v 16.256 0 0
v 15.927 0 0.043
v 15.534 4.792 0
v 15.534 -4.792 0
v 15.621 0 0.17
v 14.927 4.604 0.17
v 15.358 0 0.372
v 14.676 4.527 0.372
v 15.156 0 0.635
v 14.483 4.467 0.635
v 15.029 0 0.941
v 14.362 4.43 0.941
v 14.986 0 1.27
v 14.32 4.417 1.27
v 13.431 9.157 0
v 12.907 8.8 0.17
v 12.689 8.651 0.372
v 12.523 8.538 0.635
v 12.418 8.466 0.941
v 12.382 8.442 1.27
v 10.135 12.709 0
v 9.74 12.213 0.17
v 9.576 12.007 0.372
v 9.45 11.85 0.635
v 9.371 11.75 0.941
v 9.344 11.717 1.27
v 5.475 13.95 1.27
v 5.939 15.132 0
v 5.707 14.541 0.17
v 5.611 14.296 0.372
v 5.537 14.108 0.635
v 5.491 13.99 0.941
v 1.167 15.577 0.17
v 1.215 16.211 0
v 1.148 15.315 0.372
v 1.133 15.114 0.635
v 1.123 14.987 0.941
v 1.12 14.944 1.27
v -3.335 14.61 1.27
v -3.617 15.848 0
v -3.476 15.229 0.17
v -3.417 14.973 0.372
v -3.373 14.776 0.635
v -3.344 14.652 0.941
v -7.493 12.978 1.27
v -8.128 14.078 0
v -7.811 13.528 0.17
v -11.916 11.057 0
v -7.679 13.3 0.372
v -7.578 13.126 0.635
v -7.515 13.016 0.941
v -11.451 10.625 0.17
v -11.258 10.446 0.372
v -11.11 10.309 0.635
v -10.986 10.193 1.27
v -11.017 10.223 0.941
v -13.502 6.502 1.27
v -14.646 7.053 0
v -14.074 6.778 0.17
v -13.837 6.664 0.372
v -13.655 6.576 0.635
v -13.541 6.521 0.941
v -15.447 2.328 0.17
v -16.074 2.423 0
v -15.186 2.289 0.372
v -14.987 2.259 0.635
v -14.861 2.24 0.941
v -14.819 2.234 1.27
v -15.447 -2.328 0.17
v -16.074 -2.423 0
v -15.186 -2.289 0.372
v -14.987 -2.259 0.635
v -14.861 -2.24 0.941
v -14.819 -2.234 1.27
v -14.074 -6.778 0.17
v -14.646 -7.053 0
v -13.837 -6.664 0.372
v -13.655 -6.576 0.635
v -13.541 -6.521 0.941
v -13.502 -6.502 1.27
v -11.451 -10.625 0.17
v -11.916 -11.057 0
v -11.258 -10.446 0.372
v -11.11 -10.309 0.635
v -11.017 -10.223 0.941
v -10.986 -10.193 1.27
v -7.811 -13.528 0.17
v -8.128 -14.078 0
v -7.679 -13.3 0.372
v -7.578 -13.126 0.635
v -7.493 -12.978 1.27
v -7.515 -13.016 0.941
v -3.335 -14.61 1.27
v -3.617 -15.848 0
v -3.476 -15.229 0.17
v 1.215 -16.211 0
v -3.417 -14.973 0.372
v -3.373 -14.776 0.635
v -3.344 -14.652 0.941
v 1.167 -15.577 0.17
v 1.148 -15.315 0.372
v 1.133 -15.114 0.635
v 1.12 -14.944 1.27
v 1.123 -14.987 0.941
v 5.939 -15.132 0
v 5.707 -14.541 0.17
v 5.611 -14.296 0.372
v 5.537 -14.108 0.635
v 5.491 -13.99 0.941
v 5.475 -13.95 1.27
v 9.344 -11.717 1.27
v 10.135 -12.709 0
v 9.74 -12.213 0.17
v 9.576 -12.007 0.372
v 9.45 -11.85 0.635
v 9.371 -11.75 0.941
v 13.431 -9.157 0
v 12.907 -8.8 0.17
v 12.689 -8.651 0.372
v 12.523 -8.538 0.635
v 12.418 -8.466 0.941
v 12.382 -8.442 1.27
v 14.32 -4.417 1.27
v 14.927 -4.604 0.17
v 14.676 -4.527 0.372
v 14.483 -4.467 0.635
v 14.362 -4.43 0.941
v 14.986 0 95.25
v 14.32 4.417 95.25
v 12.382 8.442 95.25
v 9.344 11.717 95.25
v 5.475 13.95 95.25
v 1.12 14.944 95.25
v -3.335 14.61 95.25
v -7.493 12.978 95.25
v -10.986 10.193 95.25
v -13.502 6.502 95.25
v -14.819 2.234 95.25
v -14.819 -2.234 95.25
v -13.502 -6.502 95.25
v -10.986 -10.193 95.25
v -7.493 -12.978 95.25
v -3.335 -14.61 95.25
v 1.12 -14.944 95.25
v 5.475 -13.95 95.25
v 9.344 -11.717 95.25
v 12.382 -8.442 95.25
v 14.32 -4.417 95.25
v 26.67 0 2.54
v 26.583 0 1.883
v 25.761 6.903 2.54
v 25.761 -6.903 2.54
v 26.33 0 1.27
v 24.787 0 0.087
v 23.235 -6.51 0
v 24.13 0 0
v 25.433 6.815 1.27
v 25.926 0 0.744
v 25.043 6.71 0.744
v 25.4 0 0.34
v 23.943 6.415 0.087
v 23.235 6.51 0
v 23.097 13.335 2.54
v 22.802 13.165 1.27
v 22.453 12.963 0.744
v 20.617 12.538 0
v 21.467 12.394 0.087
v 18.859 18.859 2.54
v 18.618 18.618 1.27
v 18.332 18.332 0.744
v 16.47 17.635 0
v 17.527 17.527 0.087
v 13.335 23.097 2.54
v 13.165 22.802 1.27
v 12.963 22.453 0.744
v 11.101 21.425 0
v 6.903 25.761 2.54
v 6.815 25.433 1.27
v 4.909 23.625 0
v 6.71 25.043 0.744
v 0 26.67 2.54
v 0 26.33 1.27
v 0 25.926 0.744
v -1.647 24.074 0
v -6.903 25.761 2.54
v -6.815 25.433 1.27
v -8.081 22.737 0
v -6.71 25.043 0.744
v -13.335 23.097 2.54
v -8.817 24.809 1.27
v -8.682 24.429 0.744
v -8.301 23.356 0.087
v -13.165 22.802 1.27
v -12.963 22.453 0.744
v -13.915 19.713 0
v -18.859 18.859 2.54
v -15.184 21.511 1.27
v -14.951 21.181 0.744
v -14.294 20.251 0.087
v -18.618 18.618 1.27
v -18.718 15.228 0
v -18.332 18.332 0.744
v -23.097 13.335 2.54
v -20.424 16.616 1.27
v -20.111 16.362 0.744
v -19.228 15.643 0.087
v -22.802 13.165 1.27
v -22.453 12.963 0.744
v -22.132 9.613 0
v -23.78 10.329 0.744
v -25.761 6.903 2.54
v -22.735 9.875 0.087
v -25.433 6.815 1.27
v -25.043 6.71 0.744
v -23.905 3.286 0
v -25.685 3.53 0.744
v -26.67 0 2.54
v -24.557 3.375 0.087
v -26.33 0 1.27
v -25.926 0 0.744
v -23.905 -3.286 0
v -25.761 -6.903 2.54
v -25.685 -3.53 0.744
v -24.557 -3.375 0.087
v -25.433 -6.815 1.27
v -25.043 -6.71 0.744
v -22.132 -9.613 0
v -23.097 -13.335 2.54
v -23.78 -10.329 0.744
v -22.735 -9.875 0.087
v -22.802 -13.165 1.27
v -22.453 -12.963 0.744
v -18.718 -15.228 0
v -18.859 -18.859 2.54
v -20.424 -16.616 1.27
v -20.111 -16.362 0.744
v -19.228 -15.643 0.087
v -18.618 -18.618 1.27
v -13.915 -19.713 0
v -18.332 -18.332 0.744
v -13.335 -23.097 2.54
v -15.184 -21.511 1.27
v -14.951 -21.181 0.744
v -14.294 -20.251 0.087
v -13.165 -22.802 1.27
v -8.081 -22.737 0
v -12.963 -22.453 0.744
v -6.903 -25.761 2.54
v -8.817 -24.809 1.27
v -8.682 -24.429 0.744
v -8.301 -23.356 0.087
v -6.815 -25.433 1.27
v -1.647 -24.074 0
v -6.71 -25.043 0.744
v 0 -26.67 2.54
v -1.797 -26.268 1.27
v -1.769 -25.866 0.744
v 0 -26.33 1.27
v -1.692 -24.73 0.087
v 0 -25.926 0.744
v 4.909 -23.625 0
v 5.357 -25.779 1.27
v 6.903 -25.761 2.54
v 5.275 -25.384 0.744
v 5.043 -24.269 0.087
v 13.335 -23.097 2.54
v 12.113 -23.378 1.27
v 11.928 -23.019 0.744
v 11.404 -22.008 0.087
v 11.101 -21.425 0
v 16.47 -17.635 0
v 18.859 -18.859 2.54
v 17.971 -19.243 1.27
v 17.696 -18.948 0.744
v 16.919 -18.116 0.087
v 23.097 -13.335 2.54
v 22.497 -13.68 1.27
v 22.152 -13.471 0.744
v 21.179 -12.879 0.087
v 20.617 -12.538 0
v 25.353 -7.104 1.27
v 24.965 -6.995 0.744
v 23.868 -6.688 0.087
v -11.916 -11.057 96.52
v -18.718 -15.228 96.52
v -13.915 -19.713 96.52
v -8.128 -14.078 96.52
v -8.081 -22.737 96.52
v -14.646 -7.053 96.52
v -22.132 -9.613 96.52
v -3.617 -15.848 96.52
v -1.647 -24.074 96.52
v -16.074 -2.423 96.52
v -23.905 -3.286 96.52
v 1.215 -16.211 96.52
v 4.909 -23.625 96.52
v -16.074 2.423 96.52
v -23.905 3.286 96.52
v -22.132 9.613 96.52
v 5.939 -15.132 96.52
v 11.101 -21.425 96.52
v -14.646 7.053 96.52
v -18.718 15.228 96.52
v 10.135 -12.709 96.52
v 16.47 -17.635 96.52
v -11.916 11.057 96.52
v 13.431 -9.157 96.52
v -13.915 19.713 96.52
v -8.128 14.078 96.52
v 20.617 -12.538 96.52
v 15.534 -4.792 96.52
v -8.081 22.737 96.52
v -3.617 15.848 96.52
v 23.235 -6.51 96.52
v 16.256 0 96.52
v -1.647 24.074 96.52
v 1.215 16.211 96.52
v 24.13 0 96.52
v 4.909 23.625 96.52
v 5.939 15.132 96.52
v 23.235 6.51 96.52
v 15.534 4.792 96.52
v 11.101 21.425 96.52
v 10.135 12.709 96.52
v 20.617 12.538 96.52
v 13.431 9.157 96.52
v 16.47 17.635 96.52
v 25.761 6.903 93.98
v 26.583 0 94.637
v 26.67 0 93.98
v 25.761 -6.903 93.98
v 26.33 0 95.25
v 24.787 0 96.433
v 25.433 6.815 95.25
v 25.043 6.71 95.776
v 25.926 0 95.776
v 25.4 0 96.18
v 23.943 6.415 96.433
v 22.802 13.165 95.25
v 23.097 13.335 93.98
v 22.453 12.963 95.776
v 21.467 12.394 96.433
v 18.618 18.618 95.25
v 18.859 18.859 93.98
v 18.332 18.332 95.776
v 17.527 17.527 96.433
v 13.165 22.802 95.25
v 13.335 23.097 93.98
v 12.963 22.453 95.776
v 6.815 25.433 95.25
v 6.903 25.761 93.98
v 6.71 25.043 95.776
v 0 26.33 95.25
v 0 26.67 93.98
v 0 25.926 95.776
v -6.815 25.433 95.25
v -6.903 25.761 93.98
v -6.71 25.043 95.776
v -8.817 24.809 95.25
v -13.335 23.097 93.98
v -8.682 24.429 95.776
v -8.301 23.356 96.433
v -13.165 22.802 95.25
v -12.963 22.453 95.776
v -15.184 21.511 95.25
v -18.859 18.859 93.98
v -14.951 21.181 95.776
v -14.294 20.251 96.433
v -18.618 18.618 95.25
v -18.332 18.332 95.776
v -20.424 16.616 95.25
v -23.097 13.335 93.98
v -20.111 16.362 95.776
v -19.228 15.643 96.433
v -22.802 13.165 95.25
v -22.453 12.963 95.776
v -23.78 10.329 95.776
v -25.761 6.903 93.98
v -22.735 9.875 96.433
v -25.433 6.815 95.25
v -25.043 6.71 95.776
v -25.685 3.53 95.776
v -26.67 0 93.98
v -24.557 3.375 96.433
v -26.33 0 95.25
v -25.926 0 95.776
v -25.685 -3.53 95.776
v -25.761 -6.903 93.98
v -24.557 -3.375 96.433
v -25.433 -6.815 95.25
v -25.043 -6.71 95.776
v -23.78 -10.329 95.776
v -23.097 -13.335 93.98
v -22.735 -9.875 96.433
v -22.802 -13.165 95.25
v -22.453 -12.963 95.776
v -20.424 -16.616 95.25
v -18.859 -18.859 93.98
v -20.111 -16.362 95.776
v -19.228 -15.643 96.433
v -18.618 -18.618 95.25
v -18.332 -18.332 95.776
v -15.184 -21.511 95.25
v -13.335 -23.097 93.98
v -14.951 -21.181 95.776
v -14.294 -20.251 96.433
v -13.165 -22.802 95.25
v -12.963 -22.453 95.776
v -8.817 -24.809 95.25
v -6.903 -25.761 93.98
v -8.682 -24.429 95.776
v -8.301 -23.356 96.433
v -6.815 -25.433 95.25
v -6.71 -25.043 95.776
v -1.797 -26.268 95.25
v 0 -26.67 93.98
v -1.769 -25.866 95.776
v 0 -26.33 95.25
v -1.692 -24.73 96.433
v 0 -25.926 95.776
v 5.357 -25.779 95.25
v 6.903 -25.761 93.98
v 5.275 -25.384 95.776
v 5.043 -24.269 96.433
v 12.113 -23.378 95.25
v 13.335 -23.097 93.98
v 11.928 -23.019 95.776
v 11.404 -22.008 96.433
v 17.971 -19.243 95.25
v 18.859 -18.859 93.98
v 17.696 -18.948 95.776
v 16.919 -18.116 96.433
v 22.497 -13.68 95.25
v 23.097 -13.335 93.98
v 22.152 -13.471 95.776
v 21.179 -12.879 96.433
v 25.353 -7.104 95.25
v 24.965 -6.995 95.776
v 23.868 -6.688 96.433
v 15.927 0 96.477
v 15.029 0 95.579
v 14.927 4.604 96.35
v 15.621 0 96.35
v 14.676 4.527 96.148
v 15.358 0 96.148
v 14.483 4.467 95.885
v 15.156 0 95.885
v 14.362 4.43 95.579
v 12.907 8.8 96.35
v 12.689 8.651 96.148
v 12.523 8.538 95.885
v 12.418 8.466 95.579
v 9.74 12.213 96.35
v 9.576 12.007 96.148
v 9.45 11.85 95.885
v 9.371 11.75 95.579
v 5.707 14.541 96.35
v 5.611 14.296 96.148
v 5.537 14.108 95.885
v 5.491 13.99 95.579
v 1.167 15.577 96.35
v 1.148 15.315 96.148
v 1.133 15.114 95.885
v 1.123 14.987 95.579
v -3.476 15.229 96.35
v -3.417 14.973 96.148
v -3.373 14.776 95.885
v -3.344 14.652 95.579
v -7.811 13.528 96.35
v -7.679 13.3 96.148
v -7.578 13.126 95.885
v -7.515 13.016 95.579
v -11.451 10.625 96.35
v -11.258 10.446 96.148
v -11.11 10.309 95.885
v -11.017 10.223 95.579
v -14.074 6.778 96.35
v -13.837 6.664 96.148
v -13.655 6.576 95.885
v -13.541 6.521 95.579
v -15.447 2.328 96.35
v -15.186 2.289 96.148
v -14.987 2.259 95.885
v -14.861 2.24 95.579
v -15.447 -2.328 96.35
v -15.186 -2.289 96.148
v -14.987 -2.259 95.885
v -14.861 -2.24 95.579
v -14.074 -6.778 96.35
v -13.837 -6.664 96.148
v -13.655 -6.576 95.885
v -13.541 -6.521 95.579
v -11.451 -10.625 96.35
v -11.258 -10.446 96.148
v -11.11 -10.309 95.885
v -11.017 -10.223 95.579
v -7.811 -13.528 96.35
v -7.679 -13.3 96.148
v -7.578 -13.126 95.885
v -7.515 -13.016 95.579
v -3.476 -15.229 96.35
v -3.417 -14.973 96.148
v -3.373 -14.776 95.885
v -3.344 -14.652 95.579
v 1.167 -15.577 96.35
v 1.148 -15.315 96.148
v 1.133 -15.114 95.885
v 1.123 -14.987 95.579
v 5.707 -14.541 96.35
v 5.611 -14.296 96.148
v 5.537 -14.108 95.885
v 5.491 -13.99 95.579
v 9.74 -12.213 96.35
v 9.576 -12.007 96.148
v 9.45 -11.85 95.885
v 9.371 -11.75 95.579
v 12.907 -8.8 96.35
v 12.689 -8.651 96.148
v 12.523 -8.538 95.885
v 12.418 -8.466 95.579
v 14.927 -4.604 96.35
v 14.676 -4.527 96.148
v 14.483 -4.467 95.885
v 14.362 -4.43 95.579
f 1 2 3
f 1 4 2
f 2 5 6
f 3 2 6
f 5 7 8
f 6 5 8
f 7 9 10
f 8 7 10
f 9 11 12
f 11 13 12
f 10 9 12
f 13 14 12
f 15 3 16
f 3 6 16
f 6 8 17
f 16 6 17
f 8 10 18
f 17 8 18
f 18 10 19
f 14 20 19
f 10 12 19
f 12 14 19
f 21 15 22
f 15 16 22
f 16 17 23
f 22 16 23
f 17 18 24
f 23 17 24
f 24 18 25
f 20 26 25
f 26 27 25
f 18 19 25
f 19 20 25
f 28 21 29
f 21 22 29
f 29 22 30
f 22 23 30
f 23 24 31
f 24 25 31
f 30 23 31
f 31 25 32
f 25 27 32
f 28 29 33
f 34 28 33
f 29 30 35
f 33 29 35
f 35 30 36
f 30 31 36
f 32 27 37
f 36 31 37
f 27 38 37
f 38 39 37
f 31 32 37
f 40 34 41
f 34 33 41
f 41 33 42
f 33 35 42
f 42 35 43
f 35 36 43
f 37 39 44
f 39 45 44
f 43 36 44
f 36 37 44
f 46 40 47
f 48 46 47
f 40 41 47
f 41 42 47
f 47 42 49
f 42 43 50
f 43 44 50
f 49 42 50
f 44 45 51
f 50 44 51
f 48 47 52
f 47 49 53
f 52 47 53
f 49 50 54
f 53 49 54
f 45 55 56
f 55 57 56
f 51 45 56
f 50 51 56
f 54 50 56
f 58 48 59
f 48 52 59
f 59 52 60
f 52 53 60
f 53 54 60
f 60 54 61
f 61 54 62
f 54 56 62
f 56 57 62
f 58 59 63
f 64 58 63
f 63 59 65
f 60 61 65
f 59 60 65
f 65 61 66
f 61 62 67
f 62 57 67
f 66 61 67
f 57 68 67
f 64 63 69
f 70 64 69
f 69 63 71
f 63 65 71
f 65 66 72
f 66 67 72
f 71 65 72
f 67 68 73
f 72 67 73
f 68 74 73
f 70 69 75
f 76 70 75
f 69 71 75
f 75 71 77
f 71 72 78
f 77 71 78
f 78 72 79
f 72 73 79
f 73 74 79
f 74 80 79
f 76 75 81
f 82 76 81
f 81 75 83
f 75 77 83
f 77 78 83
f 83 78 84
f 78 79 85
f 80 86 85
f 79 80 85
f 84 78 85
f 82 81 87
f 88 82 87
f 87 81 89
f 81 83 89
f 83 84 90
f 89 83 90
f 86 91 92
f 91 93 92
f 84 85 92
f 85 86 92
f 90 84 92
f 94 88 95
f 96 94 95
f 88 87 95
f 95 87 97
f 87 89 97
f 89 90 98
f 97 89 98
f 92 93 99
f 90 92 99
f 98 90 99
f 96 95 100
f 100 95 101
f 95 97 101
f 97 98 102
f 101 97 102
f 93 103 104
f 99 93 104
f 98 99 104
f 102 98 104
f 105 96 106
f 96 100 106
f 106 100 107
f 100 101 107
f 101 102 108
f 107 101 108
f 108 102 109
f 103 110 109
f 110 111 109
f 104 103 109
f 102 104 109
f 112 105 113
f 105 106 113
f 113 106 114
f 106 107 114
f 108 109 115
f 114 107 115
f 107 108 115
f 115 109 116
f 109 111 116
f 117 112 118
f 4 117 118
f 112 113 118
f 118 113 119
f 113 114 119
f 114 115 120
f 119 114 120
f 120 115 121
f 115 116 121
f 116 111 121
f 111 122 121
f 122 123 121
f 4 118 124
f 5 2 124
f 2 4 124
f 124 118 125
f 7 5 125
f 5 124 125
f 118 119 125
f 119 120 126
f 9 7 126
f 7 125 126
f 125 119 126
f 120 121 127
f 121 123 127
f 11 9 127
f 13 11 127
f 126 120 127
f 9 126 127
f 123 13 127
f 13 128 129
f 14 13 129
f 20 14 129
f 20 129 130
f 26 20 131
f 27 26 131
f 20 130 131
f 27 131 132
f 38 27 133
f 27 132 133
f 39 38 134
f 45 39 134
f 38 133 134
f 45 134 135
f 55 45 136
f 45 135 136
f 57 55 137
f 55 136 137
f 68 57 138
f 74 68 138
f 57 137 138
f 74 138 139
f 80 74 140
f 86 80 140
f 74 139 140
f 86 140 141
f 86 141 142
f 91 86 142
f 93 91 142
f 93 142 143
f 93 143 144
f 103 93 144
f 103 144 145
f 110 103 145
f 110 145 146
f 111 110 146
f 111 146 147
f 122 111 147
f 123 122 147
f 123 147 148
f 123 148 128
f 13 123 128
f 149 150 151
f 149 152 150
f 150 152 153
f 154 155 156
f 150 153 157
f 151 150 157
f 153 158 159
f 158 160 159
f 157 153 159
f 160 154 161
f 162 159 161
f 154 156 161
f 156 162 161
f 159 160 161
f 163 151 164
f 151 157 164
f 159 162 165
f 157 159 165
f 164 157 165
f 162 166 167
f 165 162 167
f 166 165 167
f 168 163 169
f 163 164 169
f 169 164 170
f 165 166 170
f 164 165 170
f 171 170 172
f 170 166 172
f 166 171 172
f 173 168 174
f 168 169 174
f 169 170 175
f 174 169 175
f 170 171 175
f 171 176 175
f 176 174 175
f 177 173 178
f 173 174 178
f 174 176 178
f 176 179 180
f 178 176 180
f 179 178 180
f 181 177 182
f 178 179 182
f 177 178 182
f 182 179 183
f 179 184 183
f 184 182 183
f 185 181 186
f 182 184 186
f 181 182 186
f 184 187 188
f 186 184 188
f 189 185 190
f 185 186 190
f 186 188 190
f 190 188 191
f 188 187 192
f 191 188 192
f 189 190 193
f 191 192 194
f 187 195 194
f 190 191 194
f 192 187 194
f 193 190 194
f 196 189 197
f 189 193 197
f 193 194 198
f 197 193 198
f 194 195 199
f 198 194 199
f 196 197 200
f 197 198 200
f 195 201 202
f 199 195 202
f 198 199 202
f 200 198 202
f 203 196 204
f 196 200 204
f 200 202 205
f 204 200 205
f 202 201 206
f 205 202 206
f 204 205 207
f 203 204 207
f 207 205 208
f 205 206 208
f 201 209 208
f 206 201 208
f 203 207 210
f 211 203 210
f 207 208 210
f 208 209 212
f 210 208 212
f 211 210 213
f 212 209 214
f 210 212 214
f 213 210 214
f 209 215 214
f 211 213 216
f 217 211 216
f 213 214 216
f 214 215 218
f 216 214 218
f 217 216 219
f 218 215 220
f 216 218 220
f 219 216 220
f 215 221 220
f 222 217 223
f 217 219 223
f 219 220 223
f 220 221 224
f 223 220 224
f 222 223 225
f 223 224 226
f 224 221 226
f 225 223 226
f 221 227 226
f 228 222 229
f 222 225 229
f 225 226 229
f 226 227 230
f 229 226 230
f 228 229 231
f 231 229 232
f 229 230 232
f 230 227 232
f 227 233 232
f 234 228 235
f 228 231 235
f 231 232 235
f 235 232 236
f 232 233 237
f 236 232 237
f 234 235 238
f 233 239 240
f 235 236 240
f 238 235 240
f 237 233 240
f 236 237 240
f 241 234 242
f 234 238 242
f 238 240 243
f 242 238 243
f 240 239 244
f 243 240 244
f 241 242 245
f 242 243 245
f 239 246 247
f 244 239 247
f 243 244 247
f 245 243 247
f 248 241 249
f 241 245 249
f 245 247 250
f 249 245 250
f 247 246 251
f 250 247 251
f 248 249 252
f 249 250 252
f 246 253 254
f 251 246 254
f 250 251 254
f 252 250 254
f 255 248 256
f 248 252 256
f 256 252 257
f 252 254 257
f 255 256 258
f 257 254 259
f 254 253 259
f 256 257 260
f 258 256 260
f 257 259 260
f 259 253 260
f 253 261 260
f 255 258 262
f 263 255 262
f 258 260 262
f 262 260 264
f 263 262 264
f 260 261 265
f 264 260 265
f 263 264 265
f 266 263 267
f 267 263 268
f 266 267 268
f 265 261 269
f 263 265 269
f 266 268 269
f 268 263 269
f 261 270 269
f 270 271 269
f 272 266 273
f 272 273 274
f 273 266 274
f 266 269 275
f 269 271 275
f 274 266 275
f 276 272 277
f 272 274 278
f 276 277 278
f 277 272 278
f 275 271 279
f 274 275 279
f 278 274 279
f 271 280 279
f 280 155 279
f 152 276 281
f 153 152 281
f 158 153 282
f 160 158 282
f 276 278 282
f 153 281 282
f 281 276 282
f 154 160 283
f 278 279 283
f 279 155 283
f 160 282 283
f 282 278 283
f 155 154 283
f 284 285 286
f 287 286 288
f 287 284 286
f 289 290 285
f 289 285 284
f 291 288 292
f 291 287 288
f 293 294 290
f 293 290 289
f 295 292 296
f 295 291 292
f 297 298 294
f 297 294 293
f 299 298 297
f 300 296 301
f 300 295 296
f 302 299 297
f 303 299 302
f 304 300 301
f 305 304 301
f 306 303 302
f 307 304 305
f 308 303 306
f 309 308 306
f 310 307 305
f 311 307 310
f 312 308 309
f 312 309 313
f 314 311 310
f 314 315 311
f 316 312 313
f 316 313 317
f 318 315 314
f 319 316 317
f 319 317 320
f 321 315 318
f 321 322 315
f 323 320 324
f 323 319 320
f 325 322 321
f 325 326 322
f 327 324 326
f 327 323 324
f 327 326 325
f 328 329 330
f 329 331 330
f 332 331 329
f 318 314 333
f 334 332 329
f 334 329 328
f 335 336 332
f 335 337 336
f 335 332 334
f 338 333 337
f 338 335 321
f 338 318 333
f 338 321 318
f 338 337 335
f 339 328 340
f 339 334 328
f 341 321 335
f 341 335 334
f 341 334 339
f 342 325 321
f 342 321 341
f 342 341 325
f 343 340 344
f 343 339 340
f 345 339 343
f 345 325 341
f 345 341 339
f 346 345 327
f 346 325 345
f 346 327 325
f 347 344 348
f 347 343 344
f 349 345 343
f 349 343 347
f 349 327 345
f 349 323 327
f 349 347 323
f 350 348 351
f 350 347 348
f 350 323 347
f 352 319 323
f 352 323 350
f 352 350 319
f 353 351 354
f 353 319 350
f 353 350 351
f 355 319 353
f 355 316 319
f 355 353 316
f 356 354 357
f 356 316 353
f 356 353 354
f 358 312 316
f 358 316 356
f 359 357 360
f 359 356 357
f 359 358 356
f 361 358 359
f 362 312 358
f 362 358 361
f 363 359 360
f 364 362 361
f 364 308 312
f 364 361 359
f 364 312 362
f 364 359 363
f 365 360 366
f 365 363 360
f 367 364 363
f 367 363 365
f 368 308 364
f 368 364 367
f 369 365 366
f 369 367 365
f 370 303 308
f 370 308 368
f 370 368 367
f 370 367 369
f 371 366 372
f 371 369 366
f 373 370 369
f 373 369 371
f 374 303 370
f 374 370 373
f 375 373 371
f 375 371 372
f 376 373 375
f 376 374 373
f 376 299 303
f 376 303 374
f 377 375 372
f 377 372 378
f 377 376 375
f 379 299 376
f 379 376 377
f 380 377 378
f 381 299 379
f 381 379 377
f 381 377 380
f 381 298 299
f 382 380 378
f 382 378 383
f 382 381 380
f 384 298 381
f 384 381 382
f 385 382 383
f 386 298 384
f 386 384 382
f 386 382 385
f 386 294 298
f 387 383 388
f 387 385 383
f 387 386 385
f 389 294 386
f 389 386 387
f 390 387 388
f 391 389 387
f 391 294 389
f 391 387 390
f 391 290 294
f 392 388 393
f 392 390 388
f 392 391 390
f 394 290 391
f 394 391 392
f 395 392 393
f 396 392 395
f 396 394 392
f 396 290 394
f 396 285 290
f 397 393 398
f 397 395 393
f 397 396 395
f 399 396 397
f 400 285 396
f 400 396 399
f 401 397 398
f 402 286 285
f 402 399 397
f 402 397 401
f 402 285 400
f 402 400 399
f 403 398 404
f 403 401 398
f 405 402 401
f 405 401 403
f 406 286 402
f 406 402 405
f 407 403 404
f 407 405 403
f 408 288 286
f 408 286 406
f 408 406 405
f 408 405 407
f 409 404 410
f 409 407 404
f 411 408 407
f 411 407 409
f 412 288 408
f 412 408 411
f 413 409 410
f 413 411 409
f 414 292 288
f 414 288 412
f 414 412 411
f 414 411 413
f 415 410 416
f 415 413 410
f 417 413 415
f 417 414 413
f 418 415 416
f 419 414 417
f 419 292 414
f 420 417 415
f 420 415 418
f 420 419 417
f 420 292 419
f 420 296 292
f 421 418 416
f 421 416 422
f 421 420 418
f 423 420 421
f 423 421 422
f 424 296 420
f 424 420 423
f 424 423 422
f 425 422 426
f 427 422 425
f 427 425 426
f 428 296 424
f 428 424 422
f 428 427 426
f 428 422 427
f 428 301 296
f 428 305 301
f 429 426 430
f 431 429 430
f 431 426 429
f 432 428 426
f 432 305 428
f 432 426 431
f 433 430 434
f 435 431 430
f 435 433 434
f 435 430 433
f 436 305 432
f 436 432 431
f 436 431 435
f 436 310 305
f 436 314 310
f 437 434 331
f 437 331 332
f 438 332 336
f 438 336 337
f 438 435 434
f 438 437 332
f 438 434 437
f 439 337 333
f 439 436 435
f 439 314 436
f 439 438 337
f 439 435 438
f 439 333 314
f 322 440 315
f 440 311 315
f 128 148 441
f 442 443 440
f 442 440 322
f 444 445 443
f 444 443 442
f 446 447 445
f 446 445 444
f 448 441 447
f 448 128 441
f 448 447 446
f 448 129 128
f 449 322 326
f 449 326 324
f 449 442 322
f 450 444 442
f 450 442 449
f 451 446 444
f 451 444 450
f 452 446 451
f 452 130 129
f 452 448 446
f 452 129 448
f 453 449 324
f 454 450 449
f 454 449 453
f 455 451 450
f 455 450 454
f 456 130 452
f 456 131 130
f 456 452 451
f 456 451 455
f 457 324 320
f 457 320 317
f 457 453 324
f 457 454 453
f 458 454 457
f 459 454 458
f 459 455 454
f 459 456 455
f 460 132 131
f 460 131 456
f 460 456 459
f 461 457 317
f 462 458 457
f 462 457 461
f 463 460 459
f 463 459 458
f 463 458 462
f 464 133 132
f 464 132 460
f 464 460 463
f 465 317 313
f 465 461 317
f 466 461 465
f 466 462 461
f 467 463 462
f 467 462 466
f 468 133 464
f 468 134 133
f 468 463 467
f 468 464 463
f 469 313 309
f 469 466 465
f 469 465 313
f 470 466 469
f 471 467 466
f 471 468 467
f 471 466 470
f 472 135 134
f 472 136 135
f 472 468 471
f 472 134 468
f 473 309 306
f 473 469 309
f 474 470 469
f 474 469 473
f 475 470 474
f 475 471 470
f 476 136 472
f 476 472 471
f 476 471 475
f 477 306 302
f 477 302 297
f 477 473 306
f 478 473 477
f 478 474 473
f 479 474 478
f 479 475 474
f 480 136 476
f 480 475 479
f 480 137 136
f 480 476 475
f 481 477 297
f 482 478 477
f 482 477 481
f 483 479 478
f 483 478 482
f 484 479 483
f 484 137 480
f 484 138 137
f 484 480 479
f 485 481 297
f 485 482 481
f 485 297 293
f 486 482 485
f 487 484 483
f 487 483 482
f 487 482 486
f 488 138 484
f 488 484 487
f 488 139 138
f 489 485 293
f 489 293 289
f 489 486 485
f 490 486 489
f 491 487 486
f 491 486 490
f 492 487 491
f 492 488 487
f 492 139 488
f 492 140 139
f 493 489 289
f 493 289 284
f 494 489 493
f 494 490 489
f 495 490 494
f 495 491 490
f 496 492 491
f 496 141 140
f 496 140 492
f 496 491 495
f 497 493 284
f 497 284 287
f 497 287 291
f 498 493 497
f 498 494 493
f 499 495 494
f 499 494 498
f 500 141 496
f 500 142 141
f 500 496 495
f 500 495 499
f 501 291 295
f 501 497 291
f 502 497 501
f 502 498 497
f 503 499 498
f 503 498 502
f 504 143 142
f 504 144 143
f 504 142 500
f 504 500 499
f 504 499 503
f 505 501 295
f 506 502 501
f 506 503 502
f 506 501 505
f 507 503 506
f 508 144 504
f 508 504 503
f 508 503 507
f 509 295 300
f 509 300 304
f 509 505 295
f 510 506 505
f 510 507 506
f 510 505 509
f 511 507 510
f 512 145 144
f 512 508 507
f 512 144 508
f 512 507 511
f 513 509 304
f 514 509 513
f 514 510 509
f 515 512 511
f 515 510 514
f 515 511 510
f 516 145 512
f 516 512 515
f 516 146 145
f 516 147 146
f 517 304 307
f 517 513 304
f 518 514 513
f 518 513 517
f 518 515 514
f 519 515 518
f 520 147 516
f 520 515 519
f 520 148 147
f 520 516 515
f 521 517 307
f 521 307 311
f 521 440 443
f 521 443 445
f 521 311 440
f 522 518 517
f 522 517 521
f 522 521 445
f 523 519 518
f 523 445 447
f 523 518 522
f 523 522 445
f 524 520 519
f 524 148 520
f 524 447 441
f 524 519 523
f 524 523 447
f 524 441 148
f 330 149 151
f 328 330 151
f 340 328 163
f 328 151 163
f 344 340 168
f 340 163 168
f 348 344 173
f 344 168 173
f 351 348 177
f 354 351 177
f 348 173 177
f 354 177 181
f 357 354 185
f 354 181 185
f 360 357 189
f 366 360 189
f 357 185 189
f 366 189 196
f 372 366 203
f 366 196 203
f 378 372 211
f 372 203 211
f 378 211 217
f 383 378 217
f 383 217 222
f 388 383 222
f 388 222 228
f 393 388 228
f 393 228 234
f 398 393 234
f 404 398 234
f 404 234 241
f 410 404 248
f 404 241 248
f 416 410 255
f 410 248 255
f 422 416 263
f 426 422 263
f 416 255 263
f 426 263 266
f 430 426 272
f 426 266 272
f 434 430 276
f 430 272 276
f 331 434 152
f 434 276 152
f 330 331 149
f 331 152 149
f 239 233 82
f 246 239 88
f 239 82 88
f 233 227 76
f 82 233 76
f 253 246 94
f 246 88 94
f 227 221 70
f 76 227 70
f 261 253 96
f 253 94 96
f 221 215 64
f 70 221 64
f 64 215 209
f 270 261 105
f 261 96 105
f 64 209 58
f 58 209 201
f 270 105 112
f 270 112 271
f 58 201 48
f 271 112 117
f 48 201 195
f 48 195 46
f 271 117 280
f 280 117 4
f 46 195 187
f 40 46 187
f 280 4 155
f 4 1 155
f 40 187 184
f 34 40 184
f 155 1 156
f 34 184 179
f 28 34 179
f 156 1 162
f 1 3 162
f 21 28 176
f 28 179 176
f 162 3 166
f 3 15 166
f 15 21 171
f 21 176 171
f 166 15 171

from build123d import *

# Parameters (mm, degrees)
F0_R     = 26.67
F1_DEPTH = 96.52
F2_R     = 14.986
F3_DEPTH = 96.521
F4_R     = 2.54
F5_R     = 1.27


with BuildPart() as f1:
    # F0 (on Top) → F1 (new body)
    with BuildSketch(Plane.XY):
        Circle(F0_R)
    extrude(amount=F1_DEPTH)

    # F2 (on face) → F3 (cut, through all)
    with BuildSketch(Plane.XY.offset(96.52)):
        Circle(F2_R)
    extrude(amount=-F3_DEPTH, mode=Mode.SUBTRACT)

    # F4
    f4_edges = [f1.edges().sort_by_distance(p)[0] for p in [
        (-26.67, 0, 0),
        (-26.67, 0, 96.52),
    ]]
    fillet(f4_edges, radius=F4_R)

    # F5
    f5_edges = [f1.edges().sort_by_distance(p)[0] for p in [
        (-14.986, 0, 96.52),
        (-14.986, 0, 0),
    ]]
    fillet(f5_edges, radius=F5_R)


solid = f1.part
